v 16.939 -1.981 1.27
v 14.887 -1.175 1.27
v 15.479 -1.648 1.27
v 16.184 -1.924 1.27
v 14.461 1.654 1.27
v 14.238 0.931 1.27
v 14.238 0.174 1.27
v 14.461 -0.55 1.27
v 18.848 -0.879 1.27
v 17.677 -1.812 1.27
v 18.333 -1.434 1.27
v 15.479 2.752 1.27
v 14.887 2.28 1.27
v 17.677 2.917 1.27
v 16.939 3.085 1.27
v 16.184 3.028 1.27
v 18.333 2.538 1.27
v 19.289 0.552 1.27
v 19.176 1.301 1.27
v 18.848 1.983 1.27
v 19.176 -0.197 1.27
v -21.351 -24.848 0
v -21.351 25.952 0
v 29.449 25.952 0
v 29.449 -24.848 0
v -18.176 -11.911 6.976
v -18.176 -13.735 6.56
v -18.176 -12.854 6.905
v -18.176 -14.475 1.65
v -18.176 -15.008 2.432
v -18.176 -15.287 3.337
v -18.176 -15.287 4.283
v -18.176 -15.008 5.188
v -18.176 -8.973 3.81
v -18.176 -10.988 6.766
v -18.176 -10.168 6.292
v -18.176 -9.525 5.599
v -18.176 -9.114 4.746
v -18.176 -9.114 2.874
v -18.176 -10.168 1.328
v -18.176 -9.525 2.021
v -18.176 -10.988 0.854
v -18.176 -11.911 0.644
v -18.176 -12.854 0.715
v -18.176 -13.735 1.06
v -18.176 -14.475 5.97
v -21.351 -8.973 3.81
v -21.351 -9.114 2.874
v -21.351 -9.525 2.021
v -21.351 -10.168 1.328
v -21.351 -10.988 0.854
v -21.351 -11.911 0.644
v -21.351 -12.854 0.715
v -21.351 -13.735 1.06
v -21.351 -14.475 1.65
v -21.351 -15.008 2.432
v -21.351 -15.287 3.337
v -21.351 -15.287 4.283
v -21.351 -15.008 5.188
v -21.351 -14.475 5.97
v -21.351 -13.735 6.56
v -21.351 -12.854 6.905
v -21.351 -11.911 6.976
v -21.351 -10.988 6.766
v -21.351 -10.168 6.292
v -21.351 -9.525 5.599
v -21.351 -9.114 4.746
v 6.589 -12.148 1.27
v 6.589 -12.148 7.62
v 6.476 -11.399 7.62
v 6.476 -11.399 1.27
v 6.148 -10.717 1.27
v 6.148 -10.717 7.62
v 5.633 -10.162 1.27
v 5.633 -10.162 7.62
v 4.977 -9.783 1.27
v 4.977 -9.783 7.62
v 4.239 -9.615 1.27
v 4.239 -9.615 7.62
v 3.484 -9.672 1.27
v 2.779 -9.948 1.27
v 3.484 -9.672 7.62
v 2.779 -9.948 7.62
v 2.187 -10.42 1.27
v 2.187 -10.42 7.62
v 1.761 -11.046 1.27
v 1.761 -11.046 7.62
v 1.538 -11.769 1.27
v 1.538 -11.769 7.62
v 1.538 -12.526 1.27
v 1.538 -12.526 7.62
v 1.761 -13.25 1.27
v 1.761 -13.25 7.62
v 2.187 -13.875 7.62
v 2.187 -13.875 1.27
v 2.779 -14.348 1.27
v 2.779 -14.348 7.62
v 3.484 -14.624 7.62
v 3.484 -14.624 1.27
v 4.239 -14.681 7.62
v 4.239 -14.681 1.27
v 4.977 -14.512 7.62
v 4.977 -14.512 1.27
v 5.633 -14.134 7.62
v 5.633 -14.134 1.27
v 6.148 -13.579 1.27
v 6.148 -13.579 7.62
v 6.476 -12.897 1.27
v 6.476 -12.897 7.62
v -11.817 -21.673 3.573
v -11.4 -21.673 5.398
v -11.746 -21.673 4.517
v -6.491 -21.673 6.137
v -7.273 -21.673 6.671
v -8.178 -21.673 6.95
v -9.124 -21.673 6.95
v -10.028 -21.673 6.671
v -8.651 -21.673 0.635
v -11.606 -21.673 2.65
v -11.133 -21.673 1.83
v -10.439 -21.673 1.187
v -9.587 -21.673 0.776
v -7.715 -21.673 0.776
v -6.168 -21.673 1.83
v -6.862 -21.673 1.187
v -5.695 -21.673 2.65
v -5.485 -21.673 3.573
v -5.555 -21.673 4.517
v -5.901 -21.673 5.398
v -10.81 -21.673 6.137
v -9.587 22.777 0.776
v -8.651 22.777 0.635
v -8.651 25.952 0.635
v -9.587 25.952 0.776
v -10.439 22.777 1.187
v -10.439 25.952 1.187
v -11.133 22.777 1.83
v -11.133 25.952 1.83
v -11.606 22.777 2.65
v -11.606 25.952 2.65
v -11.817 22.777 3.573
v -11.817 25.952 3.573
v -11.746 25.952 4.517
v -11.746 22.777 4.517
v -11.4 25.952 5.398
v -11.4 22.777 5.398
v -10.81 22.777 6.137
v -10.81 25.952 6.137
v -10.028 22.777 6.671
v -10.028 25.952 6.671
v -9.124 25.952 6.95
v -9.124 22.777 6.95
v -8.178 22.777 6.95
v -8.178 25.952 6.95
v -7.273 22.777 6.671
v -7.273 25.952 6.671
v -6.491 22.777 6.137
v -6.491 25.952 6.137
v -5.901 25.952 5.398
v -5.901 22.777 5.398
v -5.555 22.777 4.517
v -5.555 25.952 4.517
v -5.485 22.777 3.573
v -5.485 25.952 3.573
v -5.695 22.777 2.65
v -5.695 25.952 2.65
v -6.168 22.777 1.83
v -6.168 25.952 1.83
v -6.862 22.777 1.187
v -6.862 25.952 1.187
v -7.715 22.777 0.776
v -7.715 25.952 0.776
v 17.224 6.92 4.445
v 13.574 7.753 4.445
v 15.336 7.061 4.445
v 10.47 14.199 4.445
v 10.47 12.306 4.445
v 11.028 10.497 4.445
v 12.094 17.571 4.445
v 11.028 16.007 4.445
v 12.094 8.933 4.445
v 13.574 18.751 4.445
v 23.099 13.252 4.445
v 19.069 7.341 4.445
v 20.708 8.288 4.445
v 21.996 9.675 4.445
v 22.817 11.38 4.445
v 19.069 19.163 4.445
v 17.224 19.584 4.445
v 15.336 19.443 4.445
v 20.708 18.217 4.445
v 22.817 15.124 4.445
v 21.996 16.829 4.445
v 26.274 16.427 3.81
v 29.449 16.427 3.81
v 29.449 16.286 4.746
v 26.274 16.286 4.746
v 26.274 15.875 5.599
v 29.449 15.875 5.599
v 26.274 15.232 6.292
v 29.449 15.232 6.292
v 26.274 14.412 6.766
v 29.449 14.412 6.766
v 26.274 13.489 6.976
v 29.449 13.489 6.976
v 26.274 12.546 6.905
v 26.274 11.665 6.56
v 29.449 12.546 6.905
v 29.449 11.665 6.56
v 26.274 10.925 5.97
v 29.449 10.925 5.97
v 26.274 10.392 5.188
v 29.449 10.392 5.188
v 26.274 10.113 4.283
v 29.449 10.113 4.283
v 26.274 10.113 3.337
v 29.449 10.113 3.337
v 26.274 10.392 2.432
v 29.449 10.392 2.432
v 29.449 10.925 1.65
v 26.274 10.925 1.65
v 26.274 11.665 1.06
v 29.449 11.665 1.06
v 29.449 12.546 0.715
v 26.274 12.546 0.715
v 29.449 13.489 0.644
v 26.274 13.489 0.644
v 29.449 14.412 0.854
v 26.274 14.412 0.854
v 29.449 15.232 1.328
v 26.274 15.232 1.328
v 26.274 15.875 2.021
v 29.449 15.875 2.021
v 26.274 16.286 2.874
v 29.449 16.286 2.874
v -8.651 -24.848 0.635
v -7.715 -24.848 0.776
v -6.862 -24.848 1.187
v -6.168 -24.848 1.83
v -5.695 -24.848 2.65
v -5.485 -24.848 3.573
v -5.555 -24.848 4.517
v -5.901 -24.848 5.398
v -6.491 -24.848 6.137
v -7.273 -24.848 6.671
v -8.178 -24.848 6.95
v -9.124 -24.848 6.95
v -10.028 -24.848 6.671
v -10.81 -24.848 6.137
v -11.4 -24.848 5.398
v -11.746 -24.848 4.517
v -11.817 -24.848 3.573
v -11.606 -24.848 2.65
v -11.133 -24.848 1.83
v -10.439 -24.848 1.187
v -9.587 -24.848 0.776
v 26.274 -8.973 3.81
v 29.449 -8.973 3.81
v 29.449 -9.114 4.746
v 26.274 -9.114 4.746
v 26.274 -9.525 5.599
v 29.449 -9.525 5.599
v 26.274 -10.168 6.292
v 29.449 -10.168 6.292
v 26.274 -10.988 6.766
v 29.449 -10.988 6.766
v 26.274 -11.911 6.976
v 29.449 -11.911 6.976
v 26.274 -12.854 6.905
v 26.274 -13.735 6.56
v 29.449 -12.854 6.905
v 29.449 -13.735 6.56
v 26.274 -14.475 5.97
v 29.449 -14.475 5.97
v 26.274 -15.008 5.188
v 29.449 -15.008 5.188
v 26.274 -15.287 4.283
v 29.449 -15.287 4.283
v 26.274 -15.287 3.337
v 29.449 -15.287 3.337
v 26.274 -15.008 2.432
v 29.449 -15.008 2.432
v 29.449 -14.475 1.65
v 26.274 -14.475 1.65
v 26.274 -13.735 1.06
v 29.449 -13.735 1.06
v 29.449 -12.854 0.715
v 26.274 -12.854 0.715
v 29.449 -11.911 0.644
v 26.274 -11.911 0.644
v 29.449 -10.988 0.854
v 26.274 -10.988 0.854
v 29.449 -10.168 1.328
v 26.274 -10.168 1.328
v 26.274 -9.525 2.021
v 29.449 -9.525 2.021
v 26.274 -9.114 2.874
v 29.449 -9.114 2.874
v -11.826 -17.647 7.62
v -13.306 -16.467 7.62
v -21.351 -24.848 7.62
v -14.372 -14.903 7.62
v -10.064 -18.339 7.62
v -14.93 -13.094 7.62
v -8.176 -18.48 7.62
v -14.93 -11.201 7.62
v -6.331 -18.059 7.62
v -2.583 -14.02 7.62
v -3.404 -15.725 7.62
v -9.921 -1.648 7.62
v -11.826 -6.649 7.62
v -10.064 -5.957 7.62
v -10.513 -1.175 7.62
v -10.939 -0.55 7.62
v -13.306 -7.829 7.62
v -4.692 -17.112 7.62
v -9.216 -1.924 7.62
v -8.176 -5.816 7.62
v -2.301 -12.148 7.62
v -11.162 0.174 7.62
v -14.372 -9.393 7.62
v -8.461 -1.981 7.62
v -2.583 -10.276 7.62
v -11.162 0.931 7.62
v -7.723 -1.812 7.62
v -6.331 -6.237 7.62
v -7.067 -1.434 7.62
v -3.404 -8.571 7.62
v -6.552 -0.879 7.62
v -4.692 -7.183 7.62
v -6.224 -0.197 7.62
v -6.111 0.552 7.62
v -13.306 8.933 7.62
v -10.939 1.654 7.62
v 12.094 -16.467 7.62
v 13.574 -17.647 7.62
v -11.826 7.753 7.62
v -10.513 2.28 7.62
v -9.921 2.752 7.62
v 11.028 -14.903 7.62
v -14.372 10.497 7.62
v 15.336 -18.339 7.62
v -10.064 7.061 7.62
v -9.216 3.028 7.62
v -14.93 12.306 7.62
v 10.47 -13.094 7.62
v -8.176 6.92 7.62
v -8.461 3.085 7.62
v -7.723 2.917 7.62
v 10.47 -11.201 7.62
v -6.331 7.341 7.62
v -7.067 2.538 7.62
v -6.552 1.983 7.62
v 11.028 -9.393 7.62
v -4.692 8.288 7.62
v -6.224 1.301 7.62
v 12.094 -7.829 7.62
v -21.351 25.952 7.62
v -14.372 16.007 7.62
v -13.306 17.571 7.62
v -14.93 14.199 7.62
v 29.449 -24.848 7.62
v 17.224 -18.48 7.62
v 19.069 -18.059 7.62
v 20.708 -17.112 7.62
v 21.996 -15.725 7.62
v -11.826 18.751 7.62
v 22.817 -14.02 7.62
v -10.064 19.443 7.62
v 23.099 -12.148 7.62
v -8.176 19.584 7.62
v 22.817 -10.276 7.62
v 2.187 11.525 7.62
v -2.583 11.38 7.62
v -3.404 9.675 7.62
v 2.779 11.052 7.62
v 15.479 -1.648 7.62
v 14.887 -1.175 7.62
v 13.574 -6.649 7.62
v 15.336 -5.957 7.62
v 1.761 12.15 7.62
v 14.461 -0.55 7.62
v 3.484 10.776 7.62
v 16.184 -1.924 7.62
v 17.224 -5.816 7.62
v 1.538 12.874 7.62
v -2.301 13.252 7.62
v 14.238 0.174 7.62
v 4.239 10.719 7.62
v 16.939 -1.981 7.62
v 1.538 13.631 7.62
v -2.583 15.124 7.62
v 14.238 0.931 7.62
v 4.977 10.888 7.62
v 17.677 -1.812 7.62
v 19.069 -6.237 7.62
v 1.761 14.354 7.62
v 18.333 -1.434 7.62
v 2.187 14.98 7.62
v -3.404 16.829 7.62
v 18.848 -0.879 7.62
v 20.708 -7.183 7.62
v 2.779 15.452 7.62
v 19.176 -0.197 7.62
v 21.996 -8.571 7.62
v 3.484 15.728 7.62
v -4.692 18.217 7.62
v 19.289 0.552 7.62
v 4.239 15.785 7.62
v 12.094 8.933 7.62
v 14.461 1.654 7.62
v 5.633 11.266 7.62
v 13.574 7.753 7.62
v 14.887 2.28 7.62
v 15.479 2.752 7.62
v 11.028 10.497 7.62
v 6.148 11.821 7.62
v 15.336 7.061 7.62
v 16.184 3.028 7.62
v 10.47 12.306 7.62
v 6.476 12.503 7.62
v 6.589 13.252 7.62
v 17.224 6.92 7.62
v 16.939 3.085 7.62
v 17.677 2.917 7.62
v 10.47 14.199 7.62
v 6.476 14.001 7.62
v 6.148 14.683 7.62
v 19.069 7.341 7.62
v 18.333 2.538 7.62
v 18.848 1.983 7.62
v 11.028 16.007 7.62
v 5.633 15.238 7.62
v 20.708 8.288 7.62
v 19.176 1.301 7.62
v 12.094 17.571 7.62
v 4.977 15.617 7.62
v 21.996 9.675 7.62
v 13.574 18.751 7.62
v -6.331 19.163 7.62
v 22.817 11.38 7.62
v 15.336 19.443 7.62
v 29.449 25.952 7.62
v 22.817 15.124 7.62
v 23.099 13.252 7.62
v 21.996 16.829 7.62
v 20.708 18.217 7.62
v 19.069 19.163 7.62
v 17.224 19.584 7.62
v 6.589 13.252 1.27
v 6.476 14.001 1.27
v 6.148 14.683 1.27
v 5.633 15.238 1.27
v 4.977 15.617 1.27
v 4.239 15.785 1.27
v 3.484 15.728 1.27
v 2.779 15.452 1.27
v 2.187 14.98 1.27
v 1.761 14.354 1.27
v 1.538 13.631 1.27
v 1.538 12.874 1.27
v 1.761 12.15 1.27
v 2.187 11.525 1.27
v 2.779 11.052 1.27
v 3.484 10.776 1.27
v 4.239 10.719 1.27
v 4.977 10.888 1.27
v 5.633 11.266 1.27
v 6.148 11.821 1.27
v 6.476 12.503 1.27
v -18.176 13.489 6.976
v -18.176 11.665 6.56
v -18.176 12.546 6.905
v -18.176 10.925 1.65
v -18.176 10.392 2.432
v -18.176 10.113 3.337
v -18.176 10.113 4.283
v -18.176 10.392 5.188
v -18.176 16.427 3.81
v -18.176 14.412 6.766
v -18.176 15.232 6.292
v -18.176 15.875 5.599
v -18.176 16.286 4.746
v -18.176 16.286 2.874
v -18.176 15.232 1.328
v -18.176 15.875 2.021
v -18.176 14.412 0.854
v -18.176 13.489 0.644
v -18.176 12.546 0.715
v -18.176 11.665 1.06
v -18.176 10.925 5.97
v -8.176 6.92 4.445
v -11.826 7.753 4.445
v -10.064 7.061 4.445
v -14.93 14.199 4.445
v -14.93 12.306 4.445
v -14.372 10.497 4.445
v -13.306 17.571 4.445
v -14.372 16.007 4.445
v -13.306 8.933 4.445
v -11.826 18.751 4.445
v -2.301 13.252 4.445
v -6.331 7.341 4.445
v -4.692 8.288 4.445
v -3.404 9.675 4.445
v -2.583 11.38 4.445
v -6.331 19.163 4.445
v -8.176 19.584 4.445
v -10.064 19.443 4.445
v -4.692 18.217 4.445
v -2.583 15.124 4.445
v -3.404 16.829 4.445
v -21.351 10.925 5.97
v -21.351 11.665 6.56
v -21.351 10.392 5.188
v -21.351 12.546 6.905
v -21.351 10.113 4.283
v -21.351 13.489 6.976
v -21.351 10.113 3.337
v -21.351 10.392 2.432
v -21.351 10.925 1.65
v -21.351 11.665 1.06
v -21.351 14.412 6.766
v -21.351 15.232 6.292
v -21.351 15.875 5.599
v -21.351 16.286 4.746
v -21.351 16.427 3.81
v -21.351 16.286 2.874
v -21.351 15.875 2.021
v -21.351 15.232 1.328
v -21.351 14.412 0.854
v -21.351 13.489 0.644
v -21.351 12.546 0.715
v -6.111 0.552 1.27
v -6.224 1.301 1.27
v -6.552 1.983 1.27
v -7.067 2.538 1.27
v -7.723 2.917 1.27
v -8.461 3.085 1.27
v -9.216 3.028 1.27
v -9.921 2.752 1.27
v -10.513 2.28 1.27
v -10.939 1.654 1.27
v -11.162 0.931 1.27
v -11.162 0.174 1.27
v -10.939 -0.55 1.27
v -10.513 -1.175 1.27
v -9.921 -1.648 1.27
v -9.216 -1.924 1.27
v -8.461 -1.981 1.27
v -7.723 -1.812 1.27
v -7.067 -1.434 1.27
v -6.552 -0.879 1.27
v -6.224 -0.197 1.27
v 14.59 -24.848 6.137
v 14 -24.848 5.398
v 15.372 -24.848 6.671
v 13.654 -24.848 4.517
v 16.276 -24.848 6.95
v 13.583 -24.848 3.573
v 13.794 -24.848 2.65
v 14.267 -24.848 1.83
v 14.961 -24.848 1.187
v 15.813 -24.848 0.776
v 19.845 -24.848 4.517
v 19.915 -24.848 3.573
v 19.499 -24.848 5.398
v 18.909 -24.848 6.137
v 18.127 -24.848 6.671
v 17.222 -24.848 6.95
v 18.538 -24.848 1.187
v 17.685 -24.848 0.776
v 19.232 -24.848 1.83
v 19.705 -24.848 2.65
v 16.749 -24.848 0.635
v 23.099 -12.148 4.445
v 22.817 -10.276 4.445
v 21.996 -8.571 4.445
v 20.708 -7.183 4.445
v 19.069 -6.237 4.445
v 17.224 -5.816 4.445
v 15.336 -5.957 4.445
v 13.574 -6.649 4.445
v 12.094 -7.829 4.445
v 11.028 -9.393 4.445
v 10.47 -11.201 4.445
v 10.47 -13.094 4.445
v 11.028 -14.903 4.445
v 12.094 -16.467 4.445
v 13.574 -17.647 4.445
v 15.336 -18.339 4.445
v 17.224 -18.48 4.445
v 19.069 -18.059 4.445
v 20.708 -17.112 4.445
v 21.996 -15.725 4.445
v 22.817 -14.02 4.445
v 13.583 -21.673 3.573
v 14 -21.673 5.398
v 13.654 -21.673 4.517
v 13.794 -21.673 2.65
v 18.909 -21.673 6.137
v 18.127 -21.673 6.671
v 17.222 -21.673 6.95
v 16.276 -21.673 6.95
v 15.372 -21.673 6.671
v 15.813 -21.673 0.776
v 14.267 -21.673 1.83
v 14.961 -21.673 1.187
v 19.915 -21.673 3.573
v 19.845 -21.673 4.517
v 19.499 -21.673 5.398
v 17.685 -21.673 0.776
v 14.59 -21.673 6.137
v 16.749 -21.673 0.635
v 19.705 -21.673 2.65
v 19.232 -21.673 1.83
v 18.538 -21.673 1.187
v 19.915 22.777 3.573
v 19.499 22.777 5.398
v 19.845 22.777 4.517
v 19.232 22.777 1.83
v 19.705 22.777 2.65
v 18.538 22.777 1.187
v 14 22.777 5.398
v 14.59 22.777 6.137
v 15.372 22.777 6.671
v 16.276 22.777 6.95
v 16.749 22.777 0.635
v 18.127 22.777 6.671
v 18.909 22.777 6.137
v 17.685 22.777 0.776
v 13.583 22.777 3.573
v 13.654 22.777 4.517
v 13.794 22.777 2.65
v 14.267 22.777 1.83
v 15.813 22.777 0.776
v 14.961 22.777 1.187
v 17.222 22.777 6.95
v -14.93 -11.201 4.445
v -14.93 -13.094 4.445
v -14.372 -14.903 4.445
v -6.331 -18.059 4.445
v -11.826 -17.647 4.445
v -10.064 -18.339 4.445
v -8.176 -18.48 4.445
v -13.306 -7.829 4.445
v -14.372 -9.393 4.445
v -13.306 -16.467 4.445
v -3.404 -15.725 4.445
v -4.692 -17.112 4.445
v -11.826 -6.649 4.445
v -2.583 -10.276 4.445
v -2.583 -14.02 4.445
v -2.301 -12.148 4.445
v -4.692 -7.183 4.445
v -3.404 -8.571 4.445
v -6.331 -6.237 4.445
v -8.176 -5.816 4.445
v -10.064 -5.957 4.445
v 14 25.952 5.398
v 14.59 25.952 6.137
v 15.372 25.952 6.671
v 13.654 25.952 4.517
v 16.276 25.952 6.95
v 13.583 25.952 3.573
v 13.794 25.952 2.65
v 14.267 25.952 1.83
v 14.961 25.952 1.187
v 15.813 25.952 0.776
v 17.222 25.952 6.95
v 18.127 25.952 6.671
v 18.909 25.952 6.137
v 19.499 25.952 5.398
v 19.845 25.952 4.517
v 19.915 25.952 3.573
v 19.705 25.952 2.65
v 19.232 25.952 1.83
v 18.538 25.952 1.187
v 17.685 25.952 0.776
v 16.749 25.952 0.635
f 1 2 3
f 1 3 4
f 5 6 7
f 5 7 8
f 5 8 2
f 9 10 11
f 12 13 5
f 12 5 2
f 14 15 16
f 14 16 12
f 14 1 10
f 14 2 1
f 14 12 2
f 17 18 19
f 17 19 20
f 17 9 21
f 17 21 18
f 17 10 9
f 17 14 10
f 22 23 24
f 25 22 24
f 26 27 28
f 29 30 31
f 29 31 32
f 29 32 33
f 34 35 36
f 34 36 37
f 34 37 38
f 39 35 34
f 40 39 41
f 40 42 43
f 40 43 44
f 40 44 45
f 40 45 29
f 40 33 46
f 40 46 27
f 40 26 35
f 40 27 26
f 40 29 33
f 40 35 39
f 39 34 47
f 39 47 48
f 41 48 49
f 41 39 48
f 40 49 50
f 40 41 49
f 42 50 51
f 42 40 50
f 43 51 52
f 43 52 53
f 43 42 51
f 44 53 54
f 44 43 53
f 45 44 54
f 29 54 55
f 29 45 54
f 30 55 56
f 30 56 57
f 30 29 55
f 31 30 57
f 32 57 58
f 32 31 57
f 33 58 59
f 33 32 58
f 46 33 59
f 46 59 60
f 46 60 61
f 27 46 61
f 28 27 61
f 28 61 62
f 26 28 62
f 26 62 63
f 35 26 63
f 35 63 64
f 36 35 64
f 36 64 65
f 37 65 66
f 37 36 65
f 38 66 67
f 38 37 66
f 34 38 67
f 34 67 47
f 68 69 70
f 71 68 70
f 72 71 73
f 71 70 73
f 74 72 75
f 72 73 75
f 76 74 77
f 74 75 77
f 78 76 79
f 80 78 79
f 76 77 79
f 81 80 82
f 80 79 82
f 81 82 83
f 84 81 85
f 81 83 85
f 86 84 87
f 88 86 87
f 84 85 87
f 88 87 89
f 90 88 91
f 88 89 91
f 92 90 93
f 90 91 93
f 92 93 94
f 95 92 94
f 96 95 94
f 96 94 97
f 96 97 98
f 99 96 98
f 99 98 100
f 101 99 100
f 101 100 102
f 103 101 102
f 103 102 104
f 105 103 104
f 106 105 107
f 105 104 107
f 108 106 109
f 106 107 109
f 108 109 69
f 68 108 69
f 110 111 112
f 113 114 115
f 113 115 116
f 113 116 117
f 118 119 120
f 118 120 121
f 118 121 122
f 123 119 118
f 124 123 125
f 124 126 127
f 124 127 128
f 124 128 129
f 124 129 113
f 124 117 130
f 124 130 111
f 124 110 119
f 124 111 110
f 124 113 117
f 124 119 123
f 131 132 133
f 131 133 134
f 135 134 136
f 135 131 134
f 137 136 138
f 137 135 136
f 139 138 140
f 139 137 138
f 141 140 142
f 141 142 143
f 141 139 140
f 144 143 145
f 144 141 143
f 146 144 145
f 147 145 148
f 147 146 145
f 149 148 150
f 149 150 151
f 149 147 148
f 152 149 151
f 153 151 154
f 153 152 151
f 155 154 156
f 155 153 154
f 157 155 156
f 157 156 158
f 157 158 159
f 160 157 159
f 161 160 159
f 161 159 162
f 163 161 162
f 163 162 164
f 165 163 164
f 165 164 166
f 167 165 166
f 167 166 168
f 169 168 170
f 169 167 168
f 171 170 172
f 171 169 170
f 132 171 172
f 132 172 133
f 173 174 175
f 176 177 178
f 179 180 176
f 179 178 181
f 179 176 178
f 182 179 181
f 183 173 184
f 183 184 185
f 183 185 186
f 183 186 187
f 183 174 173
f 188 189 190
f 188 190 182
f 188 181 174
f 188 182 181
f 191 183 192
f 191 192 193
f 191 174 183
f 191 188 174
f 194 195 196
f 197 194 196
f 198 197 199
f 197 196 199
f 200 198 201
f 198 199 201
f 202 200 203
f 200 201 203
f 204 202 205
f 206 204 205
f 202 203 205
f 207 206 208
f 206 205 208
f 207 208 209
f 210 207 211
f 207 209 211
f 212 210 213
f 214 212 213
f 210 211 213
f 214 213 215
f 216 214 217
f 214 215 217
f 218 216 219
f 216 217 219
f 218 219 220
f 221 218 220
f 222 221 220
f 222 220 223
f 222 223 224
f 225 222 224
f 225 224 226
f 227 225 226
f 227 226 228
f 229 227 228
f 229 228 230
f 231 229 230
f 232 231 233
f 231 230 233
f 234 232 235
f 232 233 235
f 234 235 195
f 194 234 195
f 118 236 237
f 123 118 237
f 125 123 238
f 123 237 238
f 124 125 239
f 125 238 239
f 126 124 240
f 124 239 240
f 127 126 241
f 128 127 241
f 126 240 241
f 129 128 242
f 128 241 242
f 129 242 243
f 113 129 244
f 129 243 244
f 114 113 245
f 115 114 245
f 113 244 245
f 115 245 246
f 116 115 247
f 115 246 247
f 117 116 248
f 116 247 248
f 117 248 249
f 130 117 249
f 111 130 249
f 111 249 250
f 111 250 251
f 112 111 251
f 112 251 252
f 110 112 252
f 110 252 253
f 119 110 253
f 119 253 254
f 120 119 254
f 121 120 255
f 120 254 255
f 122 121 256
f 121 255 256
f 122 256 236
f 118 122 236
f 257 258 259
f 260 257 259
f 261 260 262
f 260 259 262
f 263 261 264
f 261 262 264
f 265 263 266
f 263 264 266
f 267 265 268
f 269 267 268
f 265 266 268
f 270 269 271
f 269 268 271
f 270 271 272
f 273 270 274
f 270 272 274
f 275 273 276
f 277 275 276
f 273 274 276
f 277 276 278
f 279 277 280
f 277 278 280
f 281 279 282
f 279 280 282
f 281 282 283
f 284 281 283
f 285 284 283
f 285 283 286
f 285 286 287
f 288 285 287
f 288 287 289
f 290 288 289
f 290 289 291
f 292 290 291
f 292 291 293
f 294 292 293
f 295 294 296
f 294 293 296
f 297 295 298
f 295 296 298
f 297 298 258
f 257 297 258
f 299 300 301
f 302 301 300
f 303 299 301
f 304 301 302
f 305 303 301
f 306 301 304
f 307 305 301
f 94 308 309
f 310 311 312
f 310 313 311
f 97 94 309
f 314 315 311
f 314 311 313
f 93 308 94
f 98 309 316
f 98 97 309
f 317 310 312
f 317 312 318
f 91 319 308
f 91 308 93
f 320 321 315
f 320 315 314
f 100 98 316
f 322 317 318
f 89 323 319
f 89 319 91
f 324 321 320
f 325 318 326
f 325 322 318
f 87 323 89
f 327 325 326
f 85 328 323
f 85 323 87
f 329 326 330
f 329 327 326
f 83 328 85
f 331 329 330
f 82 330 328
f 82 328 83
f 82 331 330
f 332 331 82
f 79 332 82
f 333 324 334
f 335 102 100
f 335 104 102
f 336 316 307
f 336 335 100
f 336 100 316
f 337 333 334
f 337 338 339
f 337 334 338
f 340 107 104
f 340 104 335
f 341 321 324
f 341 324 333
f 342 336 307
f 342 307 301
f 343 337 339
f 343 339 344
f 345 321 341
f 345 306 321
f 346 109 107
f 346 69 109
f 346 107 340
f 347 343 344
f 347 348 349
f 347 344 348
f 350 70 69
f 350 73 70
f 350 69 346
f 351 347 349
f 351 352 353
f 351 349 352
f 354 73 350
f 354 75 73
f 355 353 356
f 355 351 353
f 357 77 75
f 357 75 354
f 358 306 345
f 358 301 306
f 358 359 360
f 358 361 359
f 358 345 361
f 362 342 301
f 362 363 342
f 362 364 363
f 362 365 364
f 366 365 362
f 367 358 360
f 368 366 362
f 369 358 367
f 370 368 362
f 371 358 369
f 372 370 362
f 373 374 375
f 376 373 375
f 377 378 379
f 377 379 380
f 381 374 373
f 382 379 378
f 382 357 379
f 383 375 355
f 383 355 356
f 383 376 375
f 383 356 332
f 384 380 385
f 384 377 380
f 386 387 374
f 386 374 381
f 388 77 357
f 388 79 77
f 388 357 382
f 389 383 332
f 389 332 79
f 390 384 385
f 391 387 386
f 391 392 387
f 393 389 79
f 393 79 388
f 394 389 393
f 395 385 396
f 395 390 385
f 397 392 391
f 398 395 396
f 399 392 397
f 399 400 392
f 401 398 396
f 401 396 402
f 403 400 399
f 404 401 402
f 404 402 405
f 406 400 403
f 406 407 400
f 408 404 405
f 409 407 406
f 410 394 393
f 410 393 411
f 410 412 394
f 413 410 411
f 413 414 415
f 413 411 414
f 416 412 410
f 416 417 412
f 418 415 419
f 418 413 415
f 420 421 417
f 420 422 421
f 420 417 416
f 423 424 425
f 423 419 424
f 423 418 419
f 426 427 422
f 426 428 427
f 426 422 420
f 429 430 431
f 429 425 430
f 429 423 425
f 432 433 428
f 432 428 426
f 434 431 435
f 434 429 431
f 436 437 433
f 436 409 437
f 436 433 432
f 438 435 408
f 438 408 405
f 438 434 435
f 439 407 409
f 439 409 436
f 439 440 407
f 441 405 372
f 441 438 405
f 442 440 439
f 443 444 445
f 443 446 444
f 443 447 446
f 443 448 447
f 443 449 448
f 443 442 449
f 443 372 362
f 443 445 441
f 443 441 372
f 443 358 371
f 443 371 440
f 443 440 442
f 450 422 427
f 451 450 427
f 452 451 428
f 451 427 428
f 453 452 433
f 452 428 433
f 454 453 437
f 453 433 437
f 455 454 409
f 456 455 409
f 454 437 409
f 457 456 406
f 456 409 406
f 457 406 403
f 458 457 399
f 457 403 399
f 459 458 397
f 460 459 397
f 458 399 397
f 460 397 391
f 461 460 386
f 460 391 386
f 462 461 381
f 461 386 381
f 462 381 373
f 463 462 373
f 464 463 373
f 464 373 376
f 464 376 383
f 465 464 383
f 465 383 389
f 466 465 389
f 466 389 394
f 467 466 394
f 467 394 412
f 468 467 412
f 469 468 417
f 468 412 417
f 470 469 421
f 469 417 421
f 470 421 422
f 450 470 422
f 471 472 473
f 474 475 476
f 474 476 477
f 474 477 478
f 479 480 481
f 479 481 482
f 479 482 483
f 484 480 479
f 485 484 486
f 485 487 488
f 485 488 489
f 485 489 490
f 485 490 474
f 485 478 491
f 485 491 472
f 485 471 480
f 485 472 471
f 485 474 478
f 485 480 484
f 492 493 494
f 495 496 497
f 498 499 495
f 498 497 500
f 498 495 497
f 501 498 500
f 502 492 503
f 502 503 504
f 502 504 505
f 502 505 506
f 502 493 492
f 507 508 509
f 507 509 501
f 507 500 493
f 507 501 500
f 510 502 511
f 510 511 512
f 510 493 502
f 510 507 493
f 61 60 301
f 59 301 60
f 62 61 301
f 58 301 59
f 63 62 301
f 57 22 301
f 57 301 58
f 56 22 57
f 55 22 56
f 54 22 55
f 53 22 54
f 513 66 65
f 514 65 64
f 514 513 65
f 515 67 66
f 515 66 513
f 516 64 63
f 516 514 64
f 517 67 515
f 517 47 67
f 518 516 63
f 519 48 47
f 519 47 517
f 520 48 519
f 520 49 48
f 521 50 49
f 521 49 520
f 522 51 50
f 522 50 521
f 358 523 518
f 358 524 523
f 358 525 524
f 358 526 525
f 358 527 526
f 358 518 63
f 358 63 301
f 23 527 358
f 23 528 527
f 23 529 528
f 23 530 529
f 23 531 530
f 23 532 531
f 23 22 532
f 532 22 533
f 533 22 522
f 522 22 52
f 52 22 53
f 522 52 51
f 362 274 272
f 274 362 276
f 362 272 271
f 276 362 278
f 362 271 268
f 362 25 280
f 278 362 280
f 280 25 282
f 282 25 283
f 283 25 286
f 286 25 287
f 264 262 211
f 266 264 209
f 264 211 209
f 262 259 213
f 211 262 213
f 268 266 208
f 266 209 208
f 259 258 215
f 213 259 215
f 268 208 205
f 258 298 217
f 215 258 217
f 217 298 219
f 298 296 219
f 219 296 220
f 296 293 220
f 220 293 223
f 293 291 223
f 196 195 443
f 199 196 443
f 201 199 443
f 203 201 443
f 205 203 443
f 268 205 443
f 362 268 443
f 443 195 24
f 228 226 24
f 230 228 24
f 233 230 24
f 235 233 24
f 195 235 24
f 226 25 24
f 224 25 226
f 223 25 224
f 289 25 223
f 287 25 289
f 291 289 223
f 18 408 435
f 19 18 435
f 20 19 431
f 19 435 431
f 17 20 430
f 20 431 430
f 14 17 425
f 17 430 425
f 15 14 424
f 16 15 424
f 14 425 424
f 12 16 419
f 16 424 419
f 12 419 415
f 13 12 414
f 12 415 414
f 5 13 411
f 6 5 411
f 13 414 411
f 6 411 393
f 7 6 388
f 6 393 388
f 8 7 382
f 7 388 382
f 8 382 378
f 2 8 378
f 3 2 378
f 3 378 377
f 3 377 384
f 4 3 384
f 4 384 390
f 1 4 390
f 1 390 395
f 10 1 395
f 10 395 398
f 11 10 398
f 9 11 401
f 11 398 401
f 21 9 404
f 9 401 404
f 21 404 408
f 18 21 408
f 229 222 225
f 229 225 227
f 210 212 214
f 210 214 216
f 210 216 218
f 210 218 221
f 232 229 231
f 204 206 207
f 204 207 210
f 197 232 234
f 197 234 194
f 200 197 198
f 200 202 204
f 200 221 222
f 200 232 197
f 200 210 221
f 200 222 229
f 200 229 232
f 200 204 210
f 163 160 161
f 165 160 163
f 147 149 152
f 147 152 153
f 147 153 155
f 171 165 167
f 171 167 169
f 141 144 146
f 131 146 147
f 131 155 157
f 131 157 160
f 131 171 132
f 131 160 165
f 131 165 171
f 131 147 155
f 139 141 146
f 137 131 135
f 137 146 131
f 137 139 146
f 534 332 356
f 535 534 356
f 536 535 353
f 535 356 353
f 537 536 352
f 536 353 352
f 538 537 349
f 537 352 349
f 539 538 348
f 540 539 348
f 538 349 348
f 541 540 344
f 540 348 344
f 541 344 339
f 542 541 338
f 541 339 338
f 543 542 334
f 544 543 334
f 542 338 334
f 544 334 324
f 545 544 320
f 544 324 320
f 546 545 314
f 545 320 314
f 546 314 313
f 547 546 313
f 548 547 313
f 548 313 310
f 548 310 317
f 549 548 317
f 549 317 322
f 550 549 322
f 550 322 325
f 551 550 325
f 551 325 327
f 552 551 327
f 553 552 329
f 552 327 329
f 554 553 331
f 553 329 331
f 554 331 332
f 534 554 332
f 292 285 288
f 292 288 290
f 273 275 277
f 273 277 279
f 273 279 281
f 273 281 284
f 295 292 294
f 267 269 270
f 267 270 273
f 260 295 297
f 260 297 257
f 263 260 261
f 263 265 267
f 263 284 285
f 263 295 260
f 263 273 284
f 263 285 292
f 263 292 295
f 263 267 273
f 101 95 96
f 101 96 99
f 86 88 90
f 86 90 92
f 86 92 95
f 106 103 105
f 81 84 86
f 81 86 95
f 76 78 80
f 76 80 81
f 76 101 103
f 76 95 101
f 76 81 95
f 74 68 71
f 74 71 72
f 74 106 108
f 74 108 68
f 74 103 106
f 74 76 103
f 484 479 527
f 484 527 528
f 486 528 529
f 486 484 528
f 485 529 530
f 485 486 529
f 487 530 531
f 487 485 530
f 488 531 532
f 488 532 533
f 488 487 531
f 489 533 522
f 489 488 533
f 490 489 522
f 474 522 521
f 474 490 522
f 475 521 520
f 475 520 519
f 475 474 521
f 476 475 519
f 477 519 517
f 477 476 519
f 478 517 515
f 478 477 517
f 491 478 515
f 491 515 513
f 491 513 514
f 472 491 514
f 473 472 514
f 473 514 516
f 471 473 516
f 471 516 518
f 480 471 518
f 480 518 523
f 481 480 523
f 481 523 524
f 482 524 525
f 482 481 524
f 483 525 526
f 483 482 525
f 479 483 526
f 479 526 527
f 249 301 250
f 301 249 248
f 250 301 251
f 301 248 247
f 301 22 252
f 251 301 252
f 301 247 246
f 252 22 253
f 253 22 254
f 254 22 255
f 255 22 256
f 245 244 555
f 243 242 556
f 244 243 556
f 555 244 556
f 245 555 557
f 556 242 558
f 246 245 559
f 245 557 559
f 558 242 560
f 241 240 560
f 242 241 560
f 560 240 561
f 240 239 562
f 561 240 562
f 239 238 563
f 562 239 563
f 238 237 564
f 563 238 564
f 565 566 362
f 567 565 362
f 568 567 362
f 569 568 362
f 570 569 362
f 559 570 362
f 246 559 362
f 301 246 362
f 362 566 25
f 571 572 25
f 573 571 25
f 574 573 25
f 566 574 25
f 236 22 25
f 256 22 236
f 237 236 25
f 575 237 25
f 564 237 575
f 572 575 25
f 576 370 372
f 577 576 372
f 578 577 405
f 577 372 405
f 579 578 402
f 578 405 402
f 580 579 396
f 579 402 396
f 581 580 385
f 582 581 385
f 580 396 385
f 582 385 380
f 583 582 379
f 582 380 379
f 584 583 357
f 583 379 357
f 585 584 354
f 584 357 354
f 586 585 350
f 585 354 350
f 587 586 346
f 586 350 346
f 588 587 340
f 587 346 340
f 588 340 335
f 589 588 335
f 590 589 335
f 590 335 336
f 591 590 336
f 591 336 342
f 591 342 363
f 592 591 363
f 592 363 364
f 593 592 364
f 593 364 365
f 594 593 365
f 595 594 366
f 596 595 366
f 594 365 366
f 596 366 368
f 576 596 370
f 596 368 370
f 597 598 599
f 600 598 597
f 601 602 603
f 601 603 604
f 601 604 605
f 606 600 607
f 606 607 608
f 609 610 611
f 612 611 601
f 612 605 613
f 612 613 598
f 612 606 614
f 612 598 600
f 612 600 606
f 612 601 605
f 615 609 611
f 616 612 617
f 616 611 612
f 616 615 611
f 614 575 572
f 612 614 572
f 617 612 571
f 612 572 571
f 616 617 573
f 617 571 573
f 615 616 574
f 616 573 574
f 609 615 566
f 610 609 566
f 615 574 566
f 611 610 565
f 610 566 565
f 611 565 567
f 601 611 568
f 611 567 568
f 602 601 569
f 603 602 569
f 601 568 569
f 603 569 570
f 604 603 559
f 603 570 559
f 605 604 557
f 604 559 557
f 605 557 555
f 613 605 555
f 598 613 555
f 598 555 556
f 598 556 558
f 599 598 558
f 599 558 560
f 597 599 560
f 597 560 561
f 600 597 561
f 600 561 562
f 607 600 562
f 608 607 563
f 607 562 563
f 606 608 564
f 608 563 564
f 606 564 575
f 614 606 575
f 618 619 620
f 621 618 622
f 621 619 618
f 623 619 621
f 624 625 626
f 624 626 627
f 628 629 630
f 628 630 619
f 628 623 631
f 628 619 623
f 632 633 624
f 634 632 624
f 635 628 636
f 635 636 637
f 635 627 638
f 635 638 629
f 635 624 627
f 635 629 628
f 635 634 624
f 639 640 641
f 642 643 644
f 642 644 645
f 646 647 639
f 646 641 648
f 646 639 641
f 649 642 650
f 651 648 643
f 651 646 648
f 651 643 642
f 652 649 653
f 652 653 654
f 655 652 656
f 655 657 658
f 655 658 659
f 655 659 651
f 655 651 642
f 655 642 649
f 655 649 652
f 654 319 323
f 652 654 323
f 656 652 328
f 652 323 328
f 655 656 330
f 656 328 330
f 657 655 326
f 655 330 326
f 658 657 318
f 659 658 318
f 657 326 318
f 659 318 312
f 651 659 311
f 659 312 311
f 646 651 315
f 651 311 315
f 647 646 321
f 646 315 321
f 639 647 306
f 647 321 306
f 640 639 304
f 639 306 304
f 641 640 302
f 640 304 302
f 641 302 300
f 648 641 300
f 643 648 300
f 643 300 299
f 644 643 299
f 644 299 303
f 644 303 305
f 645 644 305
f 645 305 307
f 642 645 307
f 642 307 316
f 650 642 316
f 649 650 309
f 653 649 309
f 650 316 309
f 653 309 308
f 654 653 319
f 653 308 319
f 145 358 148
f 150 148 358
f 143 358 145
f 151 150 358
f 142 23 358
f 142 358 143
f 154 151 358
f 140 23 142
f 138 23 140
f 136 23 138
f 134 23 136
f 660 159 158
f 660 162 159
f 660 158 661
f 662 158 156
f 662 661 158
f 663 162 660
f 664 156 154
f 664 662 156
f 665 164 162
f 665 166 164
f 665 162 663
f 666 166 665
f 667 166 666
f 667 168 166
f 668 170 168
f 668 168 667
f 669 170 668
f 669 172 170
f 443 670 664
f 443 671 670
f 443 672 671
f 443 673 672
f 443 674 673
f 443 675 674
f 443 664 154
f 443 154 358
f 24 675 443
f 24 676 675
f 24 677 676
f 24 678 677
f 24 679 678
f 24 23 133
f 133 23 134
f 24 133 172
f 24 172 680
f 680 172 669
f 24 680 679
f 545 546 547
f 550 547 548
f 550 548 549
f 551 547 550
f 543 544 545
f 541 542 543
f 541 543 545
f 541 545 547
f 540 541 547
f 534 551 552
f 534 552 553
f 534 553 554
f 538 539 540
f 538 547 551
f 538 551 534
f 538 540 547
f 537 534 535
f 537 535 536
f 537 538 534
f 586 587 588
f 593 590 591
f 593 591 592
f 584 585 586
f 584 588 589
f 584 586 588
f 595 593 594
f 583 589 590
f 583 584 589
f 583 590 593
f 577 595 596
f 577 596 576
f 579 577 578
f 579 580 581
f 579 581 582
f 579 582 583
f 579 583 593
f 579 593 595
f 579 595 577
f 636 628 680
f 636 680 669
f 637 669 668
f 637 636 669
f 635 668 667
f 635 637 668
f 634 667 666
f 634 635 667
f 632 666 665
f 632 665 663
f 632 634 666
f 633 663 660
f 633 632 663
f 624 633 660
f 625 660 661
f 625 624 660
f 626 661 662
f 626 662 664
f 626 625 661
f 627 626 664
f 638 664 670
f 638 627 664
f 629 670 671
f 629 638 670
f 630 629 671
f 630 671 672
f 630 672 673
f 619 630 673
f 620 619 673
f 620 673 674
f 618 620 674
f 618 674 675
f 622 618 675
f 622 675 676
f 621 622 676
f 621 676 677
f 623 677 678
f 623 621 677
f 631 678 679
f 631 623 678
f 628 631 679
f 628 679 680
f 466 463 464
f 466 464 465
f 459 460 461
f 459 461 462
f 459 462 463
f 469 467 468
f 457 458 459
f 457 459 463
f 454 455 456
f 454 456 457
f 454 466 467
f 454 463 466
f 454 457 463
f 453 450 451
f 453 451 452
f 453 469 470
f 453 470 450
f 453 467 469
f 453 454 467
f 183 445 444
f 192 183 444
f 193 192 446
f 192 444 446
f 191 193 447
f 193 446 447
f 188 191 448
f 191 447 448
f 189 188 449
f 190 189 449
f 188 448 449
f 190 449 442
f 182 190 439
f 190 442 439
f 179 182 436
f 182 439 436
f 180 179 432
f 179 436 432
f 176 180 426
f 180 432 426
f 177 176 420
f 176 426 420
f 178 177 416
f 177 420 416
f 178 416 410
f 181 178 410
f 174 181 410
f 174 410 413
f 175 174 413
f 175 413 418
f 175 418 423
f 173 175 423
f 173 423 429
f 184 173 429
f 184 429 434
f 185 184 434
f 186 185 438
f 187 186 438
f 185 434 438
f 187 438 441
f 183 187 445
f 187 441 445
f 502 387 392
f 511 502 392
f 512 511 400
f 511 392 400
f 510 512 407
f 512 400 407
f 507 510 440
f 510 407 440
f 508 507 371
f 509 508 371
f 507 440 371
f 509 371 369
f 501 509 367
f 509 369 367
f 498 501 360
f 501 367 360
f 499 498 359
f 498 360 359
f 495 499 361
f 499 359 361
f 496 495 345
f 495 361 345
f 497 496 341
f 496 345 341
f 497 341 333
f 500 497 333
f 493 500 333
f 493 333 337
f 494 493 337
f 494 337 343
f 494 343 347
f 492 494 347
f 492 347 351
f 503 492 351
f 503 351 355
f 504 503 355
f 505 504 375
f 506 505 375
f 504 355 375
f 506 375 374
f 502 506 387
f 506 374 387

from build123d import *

# Parameters (mm, degrees)
SKETCH1_W           = 50.8
SKETCH1_H           = 50.8
BOSS_EXTRUDE1_DEPTH = 7.62
SKETCH3_R           = 2.54
CUT_EXTRUDE1_DEPTH  = 6.35
SKETCH4_R           = 6.35
CUT_EXTRUDE2_DEPTH  = 3.175
SKETCH5_R           = 3.175
CUT_EXTRUDE3_DEPTH  = 3.175
SKETCH6_R           = 3.175
CUT_EXTRUDE4_DEPTH  = 3.175
CUT_EXTRUDE5_START  = -3.175
SKETCH7_R           = 3.175
CUT_EXTRUDE5_DEPTH  = 3.175
CUT_EXTRUDE6_START  = -3.175
SKETCH8_R           = 3.175
CUT_EXTRUDE6_DEPTH  = 3.175


with BuildPart() as part:
    # Sketch1 → Boss-Extrude1 (new body)
    with BuildSketch(Plane.XY):
        with Locations((4.049275362, 0.552173913)):
            Rectangle(SKETCH1_W, SKETCH1_H)
    extrude(amount=BOSS_EXTRUDE1_DEPTH)

    # Sketch3 → Cut-Extrude1 (cut)
    with BuildSketch(Plane.XY.offset(7.62)):
        with Locations((-8.650724638, 0.552173913)):
            Circle(SKETCH3_R)
        with Locations((4.049275362, 13.252173913)):
            Circle(SKETCH3_R)
        with Locations((4.049275362, -12.147826087)):
            Circle(SKETCH3_R)
        with Locations((16.749275362, 0.552173913)):
            Circle(SKETCH3_R)
    extrude(amount=-CUT_EXTRUDE1_DEPTH, mode=Mode.SUBTRACT)

    # Sketch4 → Cut-Extrude2 (cut)
    with BuildSketch(Plane.XY.offset(7.62)):
        with Locations((-8.650724638, 13.252173913)):
            Circle(SKETCH4_R)
        with Locations((16.749275362, 13.252173913)):
            Circle(SKETCH4_R)
        with Locations((16.749275362, -12.147826087)):
            Circle(SKETCH4_R)
        with Locations((-8.650724638, -12.147826087)):
            Circle(SKETCH4_R)
    extrude(amount=-CUT_EXTRUDE2_DEPTH, mode=Mode.SUBTRACT)

    # Sketch5 → Cut-Extrude3 (cut)
    with BuildSketch(Plane(origin=(29.449275362, 0, 0), x_dir=(0, 0, -1), z_dir=(1, 0, 0))):
        with Locations(Location((-3.81, 13.252173913, 0), (0, 0, 90))):
            Circle(SKETCH5_R)
        with Locations(Location((-3.81, -12.147826087, 0), (0, 0, 90))):
            Circle(SKETCH5_R)
    extrude(amount=-CUT_EXTRUDE3_DEPTH, mode=Mode.SUBTRACT)

    # Sketch6 → Cut-Extrude4 (cut)
    with BuildSketch(Plane(origin=(0, -24.847826087, 0), x_dir=(-1, 0, 0), z_dir=(0, -1, 0))):
        with Locations(Location((8.650724638, -3.81, 0), (0, 0, 90))):
            Circle(SKETCH6_R)
        with Locations(Location((-16.749275362, -3.81, 0), (0, 0, 90))):
            Circle(SKETCH6_R)
    extrude(amount=-CUT_EXTRUDE4_DEPTH, mode=Mode.SUBTRACT)

    # Sketch7 → Cut-Extrude5 (cut)
    with BuildSketch(Plane.ZY.offset(21.350724638).offset(CUT_EXTRUDE5_START)):
        with Locations(Location((3.81, 13.252173913, 0), (0, 0, 90))):
            Circle(SKETCH7_R)
        with Locations(Location((3.81, -12.147826087, 0), (0, 0, 90))):
            Circle(SKETCH7_R)
    extrude(amount=CUT_EXTRUDE5_DEPTH, mode=Mode.SUBTRACT)

    # Sketch8 → Cut-Extrude6 (cut)
    with BuildSketch(Plane(origin=(0, 25.952173913, 0), x_dir=(1, 0, 0), z_dir=(0, 1, 0)).offset(CUT_EXTRUDE6_START)):
        with Locations(Location((-8.650724638, -3.81, 0), (0, 0, 90))):
            Circle(SKETCH8_R)
        with Locations(Location((16.749275362, -3.81, 0), (0, 0, 90))):
            Circle(SKETCH8_R)
    extrude(amount=CUT_EXTRUDE6_DEPTH, mode=Mode.SUBTRACT)


solid = part.part
